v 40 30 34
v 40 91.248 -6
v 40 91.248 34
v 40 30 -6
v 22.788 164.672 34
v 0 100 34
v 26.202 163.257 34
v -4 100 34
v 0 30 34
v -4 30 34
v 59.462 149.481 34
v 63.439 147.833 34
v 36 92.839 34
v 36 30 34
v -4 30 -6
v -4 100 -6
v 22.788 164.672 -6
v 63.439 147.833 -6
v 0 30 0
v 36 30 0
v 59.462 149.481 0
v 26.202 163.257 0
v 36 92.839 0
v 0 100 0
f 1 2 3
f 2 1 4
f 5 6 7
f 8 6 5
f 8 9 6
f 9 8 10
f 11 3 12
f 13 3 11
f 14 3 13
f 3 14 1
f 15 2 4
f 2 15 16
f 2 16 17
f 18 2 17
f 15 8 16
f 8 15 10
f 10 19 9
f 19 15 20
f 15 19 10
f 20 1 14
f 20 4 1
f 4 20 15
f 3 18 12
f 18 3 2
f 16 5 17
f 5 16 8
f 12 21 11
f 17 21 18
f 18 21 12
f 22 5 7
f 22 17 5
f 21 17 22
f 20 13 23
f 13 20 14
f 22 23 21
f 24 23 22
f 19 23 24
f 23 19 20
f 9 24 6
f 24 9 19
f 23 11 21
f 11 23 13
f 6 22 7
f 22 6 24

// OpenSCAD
// wood glue hold - 22.5 degree

difference() {
   union() {
      translate([-4,30,-6]) cube([36+8,70,40],false);
      translate([-4,100,-6]) rotate([0,0,-22.5]) cube([36+8,70,40],false);
   }
   cube([36,100,45],false);
   translate([0,100,0]) rotate([0,0,-22.5]) cube([36,100,45],false);
}
